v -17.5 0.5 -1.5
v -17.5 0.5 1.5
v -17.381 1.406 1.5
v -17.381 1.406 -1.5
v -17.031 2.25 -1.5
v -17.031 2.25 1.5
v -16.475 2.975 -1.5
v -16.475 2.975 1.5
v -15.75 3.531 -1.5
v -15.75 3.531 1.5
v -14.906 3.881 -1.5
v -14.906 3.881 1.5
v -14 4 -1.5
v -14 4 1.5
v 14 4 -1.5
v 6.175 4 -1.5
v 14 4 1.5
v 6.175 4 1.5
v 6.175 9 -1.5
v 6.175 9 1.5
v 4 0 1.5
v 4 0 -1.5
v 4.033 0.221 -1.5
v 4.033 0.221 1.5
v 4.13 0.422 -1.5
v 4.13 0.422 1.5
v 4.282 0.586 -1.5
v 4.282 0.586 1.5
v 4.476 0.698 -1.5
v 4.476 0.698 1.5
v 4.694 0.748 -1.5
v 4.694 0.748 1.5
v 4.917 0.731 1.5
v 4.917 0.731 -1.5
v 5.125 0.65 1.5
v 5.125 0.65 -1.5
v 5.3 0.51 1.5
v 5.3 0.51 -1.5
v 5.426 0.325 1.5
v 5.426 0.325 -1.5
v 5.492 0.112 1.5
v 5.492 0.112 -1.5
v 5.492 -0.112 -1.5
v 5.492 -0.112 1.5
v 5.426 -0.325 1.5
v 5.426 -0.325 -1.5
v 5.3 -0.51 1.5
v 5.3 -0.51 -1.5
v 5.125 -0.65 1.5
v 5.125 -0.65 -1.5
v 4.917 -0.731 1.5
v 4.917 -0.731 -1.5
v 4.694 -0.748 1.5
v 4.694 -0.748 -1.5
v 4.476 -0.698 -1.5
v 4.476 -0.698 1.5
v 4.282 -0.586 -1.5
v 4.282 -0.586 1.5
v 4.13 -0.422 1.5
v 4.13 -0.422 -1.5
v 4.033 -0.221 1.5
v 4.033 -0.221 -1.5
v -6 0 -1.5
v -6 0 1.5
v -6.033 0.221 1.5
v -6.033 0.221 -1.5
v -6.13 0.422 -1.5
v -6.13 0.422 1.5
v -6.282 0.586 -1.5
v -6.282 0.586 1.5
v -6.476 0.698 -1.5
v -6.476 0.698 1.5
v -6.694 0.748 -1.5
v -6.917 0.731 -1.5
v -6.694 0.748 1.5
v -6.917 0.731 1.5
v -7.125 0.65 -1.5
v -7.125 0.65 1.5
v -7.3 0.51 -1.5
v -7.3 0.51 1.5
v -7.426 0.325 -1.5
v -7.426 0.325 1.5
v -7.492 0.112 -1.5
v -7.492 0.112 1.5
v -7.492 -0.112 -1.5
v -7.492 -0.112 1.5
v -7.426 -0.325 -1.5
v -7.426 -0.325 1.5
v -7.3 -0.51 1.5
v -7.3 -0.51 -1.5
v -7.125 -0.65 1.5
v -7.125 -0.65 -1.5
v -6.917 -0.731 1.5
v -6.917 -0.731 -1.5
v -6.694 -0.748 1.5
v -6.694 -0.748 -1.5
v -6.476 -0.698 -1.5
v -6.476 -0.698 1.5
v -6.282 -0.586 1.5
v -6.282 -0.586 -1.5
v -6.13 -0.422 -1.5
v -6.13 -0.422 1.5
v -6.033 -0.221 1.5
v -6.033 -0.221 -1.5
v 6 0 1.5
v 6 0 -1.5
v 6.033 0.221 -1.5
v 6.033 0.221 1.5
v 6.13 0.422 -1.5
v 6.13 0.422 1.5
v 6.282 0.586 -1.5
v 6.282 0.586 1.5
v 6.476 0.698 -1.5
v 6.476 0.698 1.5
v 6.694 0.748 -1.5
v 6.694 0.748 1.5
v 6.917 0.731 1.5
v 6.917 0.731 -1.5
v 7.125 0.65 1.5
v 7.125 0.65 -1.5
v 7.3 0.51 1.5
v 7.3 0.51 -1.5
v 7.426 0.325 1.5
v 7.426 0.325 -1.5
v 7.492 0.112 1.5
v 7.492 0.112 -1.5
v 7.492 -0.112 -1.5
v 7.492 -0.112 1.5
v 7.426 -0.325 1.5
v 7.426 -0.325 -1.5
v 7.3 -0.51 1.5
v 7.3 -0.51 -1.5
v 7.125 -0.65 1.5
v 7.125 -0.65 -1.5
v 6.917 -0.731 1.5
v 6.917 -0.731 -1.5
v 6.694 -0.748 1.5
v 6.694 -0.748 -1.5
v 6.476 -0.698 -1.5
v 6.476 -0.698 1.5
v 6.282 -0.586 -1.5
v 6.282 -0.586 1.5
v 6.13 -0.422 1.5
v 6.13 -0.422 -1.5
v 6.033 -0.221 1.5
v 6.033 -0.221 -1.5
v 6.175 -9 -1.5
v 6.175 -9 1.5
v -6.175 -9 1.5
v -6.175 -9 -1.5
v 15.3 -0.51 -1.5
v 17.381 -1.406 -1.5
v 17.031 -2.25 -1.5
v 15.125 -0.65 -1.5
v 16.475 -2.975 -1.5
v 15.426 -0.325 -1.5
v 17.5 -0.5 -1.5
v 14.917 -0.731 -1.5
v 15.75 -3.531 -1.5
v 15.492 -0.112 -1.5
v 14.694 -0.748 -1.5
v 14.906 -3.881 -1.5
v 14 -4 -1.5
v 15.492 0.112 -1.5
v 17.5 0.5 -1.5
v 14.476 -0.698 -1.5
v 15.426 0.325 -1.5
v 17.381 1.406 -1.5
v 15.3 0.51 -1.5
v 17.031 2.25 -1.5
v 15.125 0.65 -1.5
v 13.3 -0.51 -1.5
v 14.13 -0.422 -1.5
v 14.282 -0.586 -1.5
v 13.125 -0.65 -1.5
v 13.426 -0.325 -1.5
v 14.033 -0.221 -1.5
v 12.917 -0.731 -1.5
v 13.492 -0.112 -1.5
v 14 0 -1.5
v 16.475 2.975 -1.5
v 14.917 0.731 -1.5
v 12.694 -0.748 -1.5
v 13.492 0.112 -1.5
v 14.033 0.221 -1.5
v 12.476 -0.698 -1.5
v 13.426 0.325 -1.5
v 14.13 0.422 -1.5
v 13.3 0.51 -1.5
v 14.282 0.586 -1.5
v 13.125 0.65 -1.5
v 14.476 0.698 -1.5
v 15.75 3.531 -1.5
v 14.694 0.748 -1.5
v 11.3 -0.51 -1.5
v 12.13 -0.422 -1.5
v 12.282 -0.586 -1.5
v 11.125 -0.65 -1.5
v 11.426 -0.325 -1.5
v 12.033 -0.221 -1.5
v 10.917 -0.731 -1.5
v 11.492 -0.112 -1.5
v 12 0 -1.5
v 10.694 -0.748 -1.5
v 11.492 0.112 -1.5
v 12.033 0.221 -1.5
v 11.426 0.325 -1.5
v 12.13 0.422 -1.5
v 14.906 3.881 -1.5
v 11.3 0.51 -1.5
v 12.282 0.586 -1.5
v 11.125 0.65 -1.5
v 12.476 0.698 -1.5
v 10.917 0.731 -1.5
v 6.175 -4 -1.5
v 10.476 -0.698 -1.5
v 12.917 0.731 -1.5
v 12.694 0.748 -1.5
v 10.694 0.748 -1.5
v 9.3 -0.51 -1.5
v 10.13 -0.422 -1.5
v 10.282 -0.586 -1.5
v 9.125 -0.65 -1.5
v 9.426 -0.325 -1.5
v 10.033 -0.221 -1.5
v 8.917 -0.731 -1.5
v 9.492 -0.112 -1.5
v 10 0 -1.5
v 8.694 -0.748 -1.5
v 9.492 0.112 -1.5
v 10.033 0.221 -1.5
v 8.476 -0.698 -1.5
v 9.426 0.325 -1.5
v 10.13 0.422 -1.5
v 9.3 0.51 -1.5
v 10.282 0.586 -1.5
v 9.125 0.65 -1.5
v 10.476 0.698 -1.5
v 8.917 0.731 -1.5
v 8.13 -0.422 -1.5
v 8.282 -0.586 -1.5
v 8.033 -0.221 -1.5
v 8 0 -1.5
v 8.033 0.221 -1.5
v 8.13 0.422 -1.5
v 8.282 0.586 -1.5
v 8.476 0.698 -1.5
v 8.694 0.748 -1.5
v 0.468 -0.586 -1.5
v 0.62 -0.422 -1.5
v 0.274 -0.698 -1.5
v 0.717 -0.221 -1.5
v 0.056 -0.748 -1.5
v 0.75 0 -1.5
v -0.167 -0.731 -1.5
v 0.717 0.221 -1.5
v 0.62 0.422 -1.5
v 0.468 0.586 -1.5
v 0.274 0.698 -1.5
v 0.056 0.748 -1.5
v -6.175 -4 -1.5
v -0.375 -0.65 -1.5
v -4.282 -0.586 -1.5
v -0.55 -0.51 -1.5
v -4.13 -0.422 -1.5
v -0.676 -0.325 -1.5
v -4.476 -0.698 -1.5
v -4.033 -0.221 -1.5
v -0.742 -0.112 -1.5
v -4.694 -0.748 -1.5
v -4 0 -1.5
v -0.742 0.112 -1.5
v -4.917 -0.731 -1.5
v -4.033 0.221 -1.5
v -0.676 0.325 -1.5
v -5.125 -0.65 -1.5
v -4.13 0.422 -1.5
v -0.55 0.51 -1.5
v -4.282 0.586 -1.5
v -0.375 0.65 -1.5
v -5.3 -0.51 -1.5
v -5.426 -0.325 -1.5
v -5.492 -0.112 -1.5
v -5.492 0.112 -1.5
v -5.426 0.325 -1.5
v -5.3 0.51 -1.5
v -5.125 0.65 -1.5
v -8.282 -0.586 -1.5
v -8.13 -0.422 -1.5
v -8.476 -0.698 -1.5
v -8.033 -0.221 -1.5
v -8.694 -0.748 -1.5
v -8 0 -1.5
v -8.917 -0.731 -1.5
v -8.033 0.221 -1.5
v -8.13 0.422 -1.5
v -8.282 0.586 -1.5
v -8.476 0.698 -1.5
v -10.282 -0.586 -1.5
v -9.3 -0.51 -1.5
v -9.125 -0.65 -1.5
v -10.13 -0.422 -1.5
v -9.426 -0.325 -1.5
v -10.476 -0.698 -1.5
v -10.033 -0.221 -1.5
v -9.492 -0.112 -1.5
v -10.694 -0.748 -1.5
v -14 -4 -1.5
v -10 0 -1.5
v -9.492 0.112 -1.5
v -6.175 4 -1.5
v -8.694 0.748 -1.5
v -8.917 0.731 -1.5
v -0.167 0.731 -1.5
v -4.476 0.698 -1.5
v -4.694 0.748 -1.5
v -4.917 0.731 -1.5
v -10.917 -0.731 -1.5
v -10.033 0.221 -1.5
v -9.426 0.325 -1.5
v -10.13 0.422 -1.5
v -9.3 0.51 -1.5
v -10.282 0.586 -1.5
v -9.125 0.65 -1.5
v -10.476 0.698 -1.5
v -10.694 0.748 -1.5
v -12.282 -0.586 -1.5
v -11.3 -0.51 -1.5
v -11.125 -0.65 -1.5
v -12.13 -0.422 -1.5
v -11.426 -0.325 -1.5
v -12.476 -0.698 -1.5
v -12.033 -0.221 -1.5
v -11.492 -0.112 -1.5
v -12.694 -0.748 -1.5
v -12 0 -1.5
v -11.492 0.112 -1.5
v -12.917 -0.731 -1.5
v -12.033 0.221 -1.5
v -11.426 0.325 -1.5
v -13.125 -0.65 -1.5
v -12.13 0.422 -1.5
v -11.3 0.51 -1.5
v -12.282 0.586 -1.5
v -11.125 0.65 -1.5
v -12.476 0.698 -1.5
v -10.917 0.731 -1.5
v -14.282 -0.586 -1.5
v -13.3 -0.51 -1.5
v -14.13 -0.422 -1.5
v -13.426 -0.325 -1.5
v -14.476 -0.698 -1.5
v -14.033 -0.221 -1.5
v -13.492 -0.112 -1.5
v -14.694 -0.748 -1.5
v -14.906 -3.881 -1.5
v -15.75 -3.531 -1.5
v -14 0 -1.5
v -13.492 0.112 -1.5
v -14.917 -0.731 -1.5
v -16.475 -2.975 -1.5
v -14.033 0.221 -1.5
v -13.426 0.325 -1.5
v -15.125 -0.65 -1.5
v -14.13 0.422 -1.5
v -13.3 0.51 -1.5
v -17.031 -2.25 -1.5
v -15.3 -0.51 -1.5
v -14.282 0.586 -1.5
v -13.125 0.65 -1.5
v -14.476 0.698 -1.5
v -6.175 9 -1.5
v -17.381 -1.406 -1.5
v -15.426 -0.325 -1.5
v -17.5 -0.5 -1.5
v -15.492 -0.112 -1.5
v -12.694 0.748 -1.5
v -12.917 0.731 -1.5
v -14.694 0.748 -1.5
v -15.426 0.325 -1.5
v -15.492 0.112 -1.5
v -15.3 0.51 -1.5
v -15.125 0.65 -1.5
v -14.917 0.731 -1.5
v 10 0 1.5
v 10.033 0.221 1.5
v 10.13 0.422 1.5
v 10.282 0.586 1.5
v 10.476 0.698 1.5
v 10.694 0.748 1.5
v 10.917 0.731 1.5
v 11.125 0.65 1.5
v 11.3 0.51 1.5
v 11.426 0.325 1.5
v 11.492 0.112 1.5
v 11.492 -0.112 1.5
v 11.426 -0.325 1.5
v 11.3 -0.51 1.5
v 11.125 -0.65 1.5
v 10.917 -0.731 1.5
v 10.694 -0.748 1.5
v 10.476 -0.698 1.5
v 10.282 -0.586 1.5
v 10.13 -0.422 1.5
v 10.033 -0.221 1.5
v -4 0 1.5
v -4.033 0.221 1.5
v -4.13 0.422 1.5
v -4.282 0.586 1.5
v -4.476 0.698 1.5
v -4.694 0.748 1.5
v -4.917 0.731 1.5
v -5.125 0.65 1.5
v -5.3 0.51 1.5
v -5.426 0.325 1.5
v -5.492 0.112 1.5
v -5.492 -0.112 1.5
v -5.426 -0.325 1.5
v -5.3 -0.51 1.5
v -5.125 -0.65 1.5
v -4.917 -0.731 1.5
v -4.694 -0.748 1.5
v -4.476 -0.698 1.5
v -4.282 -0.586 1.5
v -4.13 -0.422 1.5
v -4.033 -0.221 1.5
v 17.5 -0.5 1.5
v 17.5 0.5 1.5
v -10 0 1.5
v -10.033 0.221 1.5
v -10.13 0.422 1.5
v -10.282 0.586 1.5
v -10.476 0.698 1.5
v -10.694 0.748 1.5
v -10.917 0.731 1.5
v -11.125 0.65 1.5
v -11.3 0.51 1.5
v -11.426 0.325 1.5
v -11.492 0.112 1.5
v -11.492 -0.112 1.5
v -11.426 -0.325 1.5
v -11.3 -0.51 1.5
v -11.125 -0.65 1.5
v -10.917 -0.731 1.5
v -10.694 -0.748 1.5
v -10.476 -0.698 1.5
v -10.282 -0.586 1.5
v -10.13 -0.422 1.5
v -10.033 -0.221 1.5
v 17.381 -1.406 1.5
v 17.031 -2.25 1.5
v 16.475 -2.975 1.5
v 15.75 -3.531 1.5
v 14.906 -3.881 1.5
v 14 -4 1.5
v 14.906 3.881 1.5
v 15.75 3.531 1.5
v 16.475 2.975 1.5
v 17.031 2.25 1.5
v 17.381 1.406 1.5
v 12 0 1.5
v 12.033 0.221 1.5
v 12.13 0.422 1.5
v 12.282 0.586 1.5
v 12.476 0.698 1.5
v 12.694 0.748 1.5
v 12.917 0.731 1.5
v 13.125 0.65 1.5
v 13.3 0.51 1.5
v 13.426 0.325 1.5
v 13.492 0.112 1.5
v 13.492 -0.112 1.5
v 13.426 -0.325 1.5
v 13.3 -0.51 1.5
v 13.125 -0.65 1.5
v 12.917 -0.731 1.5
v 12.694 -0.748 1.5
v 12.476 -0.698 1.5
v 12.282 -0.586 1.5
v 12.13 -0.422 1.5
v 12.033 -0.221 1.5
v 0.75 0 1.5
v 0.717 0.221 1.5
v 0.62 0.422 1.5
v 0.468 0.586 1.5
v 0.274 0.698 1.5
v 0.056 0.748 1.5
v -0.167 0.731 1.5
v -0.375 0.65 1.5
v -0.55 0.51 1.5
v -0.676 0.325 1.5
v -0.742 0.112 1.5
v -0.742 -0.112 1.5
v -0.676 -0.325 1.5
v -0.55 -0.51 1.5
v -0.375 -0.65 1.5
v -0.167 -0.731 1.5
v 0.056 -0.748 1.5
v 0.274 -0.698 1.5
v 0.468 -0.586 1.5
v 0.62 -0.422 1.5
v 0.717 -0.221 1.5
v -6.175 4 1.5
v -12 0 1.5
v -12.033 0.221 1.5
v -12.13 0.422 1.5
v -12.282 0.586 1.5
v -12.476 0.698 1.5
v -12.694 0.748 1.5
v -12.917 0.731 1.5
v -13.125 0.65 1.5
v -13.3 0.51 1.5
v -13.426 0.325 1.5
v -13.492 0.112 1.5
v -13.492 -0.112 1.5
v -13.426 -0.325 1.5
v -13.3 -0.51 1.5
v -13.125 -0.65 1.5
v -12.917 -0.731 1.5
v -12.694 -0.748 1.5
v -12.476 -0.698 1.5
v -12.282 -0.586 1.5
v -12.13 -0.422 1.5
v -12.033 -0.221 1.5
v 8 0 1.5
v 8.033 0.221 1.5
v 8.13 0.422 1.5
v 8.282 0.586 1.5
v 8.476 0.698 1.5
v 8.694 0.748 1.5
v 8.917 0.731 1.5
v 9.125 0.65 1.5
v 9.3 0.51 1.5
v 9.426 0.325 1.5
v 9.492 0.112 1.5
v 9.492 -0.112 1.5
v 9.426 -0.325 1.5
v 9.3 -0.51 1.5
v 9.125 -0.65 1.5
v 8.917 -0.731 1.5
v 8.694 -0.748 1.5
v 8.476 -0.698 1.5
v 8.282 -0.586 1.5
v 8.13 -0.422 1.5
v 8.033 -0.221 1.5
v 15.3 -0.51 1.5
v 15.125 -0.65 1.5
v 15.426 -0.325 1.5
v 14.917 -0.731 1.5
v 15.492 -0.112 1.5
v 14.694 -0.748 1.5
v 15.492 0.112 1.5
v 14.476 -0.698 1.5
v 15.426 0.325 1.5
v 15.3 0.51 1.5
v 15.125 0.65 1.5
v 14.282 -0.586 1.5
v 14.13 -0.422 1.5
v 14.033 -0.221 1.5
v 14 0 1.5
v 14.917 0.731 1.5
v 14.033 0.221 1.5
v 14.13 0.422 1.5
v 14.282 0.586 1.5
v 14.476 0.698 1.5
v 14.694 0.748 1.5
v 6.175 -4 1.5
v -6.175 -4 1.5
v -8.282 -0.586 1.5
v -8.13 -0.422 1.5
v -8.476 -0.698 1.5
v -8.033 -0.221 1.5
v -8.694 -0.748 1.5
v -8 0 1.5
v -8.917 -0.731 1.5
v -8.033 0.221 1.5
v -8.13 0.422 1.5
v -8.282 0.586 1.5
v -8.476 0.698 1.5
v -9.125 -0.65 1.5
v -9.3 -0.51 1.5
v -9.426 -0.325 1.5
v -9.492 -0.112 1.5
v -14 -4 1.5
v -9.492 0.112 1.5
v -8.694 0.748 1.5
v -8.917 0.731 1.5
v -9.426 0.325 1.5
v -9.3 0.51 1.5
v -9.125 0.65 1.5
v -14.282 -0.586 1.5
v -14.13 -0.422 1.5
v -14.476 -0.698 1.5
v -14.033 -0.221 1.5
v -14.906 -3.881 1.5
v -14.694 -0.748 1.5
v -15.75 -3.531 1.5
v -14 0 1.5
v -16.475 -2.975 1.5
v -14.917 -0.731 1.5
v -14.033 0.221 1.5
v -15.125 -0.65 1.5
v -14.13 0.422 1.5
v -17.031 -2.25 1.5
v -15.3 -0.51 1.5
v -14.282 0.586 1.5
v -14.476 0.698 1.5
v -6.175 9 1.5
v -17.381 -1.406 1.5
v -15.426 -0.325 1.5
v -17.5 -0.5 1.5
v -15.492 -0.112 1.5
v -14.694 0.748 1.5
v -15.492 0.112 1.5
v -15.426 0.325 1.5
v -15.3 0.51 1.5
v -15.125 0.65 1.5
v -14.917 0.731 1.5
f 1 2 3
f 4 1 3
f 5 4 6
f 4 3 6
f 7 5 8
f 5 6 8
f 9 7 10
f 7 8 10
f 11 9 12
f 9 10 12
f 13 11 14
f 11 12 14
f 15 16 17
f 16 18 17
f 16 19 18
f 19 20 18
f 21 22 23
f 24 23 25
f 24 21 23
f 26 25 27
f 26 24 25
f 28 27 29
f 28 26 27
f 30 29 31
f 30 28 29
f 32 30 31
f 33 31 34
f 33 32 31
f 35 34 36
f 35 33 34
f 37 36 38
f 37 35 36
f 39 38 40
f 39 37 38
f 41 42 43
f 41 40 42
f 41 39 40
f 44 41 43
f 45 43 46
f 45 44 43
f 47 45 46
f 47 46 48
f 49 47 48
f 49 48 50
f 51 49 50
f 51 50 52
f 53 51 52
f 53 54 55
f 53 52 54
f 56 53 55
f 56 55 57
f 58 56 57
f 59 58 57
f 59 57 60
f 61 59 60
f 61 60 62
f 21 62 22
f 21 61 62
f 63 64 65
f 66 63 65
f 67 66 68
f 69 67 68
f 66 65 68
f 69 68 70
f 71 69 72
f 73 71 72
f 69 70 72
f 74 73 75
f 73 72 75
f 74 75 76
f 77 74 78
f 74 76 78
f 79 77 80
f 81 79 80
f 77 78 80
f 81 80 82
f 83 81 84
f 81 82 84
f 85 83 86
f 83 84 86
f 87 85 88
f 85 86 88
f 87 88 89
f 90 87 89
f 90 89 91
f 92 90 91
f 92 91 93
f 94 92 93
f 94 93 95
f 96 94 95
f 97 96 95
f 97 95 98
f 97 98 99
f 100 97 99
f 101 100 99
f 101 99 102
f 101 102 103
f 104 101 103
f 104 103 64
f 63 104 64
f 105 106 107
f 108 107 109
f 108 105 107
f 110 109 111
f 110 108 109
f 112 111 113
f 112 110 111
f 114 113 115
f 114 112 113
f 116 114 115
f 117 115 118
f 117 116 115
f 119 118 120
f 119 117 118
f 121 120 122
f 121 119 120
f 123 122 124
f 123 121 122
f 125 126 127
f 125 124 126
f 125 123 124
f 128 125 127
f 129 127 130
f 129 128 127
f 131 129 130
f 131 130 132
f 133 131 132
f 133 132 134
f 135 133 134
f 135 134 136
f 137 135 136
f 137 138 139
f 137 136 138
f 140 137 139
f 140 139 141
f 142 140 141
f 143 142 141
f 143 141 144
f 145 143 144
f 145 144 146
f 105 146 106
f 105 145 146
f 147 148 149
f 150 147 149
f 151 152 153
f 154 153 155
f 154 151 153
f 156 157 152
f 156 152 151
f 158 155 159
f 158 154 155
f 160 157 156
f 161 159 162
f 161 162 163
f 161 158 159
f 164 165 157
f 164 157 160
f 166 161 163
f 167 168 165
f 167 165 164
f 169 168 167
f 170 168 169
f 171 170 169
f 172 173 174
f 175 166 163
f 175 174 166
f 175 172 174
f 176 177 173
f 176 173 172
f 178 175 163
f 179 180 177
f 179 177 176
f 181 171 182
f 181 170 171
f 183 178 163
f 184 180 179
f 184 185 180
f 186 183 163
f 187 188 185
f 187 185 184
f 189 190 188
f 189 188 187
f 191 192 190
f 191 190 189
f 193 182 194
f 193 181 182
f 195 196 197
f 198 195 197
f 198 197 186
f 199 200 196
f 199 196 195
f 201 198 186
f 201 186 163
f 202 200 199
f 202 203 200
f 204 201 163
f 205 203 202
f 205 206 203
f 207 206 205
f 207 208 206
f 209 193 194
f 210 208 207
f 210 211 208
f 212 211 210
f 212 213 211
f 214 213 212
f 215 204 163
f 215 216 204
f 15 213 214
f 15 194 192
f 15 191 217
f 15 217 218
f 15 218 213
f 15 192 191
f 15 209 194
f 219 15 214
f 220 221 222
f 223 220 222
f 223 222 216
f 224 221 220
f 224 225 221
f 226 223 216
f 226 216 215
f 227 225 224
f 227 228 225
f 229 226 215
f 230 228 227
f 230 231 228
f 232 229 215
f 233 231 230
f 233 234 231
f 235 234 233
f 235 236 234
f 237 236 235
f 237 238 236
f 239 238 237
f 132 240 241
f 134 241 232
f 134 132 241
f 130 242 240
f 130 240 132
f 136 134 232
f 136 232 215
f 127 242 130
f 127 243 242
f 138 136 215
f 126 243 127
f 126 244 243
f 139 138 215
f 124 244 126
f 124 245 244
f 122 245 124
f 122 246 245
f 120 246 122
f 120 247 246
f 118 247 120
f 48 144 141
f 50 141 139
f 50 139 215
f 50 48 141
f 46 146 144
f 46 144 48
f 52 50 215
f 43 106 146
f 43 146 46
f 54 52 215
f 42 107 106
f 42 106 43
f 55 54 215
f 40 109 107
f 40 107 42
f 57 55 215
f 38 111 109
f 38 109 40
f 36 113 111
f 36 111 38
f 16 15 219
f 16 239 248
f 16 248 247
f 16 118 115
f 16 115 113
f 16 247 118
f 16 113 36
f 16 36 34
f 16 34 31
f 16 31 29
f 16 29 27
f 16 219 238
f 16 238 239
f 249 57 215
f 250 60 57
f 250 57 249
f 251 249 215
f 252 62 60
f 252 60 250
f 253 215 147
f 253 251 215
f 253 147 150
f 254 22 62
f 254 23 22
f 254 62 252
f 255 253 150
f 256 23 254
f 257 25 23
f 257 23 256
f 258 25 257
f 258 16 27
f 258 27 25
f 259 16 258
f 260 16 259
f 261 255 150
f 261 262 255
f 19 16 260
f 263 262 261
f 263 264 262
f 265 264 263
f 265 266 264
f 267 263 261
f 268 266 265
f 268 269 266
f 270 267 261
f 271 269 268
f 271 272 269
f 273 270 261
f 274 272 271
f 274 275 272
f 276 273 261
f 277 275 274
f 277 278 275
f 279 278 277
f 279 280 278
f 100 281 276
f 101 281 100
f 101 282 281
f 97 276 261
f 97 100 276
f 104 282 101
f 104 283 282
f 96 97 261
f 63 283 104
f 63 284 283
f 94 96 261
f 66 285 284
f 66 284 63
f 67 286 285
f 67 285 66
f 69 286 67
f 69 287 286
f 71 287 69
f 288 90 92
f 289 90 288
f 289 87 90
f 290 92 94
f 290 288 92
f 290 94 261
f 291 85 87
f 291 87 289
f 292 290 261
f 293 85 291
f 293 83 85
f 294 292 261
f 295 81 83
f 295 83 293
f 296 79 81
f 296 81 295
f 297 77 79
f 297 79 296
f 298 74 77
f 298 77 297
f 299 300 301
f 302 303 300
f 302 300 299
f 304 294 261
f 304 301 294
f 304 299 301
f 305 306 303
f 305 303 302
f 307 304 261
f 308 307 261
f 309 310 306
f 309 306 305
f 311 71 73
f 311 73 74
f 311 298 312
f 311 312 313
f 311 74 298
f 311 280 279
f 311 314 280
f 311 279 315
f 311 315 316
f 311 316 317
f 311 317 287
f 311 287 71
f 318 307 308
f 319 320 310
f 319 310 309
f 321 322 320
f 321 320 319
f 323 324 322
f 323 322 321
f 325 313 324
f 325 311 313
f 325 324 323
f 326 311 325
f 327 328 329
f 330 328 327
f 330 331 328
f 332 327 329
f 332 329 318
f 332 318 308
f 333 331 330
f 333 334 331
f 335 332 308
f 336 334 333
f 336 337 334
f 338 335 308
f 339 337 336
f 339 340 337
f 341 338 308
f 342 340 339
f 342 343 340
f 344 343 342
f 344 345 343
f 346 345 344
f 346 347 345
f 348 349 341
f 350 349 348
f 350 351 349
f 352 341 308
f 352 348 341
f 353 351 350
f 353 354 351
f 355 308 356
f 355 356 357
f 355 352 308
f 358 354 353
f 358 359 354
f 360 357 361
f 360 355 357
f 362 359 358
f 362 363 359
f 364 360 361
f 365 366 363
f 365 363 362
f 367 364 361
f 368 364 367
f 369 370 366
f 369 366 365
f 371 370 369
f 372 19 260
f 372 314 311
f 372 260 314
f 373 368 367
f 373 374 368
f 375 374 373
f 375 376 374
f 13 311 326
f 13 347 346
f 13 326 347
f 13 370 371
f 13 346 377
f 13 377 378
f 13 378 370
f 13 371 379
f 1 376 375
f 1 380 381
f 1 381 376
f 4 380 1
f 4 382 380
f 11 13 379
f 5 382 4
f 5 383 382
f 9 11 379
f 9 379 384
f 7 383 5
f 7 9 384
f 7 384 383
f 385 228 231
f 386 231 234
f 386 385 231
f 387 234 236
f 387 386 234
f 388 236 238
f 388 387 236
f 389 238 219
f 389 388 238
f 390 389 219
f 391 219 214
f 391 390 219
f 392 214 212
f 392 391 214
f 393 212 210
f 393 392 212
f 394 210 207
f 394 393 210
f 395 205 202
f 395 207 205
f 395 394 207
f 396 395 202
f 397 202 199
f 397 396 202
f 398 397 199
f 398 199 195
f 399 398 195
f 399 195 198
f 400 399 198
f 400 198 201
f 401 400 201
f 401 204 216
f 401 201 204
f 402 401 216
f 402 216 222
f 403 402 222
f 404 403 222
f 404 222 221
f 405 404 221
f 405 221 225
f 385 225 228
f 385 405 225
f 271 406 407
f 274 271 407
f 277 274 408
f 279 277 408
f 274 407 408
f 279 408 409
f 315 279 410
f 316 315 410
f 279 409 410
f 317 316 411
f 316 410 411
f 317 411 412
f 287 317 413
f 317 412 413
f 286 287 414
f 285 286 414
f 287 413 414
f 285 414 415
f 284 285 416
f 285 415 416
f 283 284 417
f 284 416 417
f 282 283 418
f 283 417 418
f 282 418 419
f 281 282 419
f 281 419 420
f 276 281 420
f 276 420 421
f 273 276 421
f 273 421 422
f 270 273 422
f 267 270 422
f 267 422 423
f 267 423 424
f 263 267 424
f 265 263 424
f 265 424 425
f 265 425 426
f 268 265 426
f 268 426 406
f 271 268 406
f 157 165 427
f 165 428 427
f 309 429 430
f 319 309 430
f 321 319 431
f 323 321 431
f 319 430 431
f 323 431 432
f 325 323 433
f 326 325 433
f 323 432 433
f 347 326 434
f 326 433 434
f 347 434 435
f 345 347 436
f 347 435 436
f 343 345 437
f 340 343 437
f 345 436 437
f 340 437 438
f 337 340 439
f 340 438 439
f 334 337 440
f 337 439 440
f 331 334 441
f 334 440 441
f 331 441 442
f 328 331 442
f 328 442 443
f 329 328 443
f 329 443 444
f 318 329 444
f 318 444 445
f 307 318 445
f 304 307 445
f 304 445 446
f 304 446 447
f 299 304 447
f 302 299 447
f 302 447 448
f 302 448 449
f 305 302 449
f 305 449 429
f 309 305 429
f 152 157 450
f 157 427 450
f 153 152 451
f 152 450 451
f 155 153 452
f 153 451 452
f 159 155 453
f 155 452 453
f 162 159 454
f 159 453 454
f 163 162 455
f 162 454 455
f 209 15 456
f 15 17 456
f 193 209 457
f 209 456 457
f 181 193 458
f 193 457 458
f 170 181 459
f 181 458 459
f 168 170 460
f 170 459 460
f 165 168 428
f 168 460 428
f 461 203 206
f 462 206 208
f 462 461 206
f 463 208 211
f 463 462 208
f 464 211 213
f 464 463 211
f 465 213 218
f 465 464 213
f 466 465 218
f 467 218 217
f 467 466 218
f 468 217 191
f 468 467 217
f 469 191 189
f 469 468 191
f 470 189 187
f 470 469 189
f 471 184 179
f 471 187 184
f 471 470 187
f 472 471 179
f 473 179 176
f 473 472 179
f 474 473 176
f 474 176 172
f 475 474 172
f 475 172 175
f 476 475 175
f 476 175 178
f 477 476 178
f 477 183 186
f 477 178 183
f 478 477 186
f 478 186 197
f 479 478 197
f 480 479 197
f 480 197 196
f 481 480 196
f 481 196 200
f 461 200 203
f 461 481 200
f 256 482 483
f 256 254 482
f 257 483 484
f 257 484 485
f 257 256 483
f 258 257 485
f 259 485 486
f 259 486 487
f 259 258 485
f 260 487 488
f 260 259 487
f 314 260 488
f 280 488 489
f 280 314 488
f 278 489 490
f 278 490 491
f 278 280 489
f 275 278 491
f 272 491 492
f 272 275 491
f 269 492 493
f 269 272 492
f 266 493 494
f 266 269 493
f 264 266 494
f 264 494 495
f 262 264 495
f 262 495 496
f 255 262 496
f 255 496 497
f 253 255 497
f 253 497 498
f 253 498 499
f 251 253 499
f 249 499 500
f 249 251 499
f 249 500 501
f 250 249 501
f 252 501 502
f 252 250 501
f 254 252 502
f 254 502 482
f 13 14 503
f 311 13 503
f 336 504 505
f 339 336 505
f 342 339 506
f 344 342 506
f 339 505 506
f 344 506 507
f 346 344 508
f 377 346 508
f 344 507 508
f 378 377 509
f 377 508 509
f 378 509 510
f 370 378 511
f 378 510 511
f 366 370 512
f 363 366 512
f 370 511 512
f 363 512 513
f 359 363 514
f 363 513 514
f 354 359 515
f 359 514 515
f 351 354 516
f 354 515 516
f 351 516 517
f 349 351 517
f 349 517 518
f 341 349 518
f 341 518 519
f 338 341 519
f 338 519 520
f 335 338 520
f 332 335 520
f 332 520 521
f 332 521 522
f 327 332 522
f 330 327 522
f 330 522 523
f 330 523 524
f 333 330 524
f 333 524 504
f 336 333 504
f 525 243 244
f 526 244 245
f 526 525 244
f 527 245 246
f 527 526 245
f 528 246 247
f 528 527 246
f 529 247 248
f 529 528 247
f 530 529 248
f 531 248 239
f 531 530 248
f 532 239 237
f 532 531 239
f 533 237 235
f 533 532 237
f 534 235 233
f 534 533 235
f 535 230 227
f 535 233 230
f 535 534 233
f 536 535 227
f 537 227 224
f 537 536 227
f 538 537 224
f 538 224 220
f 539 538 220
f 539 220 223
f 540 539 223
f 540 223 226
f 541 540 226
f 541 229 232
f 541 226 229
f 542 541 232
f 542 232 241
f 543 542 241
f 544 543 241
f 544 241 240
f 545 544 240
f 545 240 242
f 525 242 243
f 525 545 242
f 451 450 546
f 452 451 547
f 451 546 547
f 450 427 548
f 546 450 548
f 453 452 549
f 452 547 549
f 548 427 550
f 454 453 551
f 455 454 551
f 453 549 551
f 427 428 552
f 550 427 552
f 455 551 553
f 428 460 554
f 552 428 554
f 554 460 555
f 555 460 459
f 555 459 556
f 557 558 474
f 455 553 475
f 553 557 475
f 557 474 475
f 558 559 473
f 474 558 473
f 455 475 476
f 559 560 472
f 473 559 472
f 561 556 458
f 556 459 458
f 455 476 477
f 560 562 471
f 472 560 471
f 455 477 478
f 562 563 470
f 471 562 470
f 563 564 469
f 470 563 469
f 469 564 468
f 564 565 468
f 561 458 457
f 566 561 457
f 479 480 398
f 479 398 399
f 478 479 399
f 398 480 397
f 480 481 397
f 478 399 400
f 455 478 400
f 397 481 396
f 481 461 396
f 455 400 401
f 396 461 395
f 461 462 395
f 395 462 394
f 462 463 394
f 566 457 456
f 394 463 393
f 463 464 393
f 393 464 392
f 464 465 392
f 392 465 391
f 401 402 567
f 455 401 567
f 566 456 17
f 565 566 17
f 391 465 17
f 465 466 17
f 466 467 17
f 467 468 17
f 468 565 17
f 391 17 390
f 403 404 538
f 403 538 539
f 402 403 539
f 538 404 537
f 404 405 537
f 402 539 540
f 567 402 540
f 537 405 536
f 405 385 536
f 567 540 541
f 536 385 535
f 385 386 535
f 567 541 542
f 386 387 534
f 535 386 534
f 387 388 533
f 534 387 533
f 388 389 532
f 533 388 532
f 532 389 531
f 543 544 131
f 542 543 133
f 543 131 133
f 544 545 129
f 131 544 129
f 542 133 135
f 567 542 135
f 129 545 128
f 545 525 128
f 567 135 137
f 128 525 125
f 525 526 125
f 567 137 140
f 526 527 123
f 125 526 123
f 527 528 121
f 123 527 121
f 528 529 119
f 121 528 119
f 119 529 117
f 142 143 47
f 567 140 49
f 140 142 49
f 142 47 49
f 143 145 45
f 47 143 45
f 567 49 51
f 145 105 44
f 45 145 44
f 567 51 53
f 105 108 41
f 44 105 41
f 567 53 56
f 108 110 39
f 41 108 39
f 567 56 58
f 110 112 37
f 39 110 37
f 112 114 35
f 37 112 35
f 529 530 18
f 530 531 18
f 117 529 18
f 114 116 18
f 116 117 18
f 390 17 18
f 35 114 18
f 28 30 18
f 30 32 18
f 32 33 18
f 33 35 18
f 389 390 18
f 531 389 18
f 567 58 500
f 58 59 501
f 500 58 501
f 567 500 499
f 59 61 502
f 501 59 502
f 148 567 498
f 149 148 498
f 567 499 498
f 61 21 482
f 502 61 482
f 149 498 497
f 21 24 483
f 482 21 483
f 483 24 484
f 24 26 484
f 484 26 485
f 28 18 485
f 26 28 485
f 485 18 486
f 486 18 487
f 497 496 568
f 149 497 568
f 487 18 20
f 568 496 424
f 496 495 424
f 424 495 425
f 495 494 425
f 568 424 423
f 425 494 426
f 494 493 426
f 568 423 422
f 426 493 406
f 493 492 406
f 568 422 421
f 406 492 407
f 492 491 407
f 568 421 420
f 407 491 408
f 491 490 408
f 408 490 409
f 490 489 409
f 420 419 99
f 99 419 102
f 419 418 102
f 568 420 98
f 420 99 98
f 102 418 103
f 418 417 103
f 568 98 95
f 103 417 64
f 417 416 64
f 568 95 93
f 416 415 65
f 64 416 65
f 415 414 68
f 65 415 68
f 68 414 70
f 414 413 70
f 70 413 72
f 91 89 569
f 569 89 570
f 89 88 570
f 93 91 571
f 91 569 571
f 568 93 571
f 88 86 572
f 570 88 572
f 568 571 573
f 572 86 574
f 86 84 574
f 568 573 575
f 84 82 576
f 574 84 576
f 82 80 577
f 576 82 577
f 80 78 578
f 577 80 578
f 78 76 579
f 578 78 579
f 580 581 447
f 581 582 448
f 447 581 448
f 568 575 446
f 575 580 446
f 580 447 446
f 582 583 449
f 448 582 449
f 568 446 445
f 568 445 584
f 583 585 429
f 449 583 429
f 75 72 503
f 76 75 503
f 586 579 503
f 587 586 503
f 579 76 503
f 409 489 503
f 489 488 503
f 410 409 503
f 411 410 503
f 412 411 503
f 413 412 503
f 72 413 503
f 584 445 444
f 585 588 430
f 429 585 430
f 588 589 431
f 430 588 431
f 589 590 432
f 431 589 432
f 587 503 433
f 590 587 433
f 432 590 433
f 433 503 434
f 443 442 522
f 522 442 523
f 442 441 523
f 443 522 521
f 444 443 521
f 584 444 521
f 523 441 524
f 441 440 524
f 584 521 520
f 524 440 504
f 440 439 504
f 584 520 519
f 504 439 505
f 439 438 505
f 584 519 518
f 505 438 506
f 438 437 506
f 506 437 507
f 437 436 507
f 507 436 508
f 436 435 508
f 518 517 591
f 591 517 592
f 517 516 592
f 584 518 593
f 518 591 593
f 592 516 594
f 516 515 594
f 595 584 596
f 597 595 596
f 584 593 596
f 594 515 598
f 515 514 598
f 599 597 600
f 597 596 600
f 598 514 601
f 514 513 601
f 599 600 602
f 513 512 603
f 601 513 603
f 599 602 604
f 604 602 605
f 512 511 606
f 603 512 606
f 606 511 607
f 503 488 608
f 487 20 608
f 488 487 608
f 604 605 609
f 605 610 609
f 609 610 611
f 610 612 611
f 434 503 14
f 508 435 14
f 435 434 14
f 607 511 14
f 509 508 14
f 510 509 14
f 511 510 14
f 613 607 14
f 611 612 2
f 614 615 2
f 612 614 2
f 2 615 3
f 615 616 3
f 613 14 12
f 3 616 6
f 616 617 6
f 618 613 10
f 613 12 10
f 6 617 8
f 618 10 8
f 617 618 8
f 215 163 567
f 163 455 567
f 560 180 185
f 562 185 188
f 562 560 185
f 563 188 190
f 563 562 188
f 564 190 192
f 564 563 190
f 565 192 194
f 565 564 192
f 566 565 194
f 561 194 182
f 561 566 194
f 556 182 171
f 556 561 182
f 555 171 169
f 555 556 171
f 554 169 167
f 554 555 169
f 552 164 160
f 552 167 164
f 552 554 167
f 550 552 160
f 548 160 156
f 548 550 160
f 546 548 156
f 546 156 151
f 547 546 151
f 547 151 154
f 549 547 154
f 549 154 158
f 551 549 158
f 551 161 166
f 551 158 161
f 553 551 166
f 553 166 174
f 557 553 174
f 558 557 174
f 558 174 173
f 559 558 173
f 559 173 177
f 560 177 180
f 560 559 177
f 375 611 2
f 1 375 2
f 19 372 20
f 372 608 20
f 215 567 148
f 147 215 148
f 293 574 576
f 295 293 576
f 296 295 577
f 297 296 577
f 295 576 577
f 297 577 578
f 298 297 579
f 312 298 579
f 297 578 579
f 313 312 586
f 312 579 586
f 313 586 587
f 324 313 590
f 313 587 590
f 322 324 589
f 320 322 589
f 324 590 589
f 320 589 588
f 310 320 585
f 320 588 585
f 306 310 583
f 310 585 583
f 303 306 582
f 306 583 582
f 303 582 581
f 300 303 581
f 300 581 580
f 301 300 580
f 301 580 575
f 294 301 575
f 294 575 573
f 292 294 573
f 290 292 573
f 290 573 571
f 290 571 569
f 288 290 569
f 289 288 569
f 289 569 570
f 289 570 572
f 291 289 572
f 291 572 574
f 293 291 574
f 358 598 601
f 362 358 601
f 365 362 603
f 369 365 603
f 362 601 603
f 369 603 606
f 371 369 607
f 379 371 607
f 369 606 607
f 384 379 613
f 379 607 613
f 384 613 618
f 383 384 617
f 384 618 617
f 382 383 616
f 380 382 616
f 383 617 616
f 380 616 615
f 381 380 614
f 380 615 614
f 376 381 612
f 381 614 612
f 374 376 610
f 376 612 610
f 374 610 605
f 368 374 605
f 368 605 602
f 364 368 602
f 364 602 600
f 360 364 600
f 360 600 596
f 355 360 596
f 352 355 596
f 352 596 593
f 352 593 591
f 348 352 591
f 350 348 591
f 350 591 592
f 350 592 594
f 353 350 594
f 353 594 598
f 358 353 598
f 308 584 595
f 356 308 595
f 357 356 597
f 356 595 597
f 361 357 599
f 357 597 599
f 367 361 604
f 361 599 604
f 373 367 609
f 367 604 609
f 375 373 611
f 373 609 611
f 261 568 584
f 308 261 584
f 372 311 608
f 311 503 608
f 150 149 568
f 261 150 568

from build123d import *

# Parameters (mm, degrees)
SKETCH1_R           = 0.75
BOSS_EXTRUDE1_DEPTH = 1.5
SKETCH2_R           = 0.75
CUT_EXTRUDE1_DEPTH  = 4


with BuildPart() as part:
    # Sketch1 → Boss-Extrude1 (new body, symmetric)
    with BuildSketch(Plane.XY):
        with BuildLine():
            Line((-14, 4), (-6.175, 4))
            Line((-6.175, 4), (-6.175, 9))
            Line((-6.175, 9), (6.175, 9))
            Line((6.175, 9), (6.175, 4))
            Line((6.175, 4), (14, 4))
            ThreePointArc((14, 4), (16.474873734, 2.974873734), (17.5, 0.5))
            Line((17.5, 0.5), (17.5, -0.5))
            ThreePointArc((17.5, -0.5), (16.474873734, -2.974873734), (14, -4))
            Line((14, -4), (6.175, -4))
            Line((6.175, -4), (6.175, -9))
            Line((6.175, -9), (-6.175, -9))
            Line((-6.175, -9), (-6.175, -4))
            Line((-6.175, -4), (-14, -4))
            ThreePointArc((-14, -4), (-16.474873734, -2.974873734), (-17.5, -0.5))
            Line((-17.5, -0.5), (-17.5, 0.5))
            ThreePointArc((-17.5, 0.5), (-16.474873734, 2.974873734), (-14, 4))
        make_face()
        Circle(SKETCH1_R, mode=Mode.SUBTRACT)
    extrude(amount=BOSS_EXTRUDE1_DEPTH, both=True)

    # Sketch2 → Cut-Extrude1 (cut, through all)
    with BuildSketch(Plane.XY.offset(1.5)):
        with Locations((-14.75, 0)):
            Circle(SKETCH2_R)
        with Locations((-12.75, 0)):
            Circle(SKETCH2_R)
        with Locations((-10.75, 0)):
            Circle(SKETCH2_R)
        with Locations((-8.75, 0)):
            Circle(SKETCH2_R)
        with Locations((-6.75, 0)):
            Circle(SKETCH2_R)
        with Locations((-4.75, 0)):
            Circle(SKETCH2_R)
    cut_extrude1 = extrude(amount=-CUT_EXTRUDE1_DEPTH, mode=Mode.SUBTRACT)

    # Mirror1: Cut-Extrude1 across plane
    add(cut_extrude1.mirror(Plane(origin=(0, 0, 0), x_dir=(0, 0, 1), z_dir=(1, 0, 0))), mode=Mode.SUBTRACT)


solid = part.part
